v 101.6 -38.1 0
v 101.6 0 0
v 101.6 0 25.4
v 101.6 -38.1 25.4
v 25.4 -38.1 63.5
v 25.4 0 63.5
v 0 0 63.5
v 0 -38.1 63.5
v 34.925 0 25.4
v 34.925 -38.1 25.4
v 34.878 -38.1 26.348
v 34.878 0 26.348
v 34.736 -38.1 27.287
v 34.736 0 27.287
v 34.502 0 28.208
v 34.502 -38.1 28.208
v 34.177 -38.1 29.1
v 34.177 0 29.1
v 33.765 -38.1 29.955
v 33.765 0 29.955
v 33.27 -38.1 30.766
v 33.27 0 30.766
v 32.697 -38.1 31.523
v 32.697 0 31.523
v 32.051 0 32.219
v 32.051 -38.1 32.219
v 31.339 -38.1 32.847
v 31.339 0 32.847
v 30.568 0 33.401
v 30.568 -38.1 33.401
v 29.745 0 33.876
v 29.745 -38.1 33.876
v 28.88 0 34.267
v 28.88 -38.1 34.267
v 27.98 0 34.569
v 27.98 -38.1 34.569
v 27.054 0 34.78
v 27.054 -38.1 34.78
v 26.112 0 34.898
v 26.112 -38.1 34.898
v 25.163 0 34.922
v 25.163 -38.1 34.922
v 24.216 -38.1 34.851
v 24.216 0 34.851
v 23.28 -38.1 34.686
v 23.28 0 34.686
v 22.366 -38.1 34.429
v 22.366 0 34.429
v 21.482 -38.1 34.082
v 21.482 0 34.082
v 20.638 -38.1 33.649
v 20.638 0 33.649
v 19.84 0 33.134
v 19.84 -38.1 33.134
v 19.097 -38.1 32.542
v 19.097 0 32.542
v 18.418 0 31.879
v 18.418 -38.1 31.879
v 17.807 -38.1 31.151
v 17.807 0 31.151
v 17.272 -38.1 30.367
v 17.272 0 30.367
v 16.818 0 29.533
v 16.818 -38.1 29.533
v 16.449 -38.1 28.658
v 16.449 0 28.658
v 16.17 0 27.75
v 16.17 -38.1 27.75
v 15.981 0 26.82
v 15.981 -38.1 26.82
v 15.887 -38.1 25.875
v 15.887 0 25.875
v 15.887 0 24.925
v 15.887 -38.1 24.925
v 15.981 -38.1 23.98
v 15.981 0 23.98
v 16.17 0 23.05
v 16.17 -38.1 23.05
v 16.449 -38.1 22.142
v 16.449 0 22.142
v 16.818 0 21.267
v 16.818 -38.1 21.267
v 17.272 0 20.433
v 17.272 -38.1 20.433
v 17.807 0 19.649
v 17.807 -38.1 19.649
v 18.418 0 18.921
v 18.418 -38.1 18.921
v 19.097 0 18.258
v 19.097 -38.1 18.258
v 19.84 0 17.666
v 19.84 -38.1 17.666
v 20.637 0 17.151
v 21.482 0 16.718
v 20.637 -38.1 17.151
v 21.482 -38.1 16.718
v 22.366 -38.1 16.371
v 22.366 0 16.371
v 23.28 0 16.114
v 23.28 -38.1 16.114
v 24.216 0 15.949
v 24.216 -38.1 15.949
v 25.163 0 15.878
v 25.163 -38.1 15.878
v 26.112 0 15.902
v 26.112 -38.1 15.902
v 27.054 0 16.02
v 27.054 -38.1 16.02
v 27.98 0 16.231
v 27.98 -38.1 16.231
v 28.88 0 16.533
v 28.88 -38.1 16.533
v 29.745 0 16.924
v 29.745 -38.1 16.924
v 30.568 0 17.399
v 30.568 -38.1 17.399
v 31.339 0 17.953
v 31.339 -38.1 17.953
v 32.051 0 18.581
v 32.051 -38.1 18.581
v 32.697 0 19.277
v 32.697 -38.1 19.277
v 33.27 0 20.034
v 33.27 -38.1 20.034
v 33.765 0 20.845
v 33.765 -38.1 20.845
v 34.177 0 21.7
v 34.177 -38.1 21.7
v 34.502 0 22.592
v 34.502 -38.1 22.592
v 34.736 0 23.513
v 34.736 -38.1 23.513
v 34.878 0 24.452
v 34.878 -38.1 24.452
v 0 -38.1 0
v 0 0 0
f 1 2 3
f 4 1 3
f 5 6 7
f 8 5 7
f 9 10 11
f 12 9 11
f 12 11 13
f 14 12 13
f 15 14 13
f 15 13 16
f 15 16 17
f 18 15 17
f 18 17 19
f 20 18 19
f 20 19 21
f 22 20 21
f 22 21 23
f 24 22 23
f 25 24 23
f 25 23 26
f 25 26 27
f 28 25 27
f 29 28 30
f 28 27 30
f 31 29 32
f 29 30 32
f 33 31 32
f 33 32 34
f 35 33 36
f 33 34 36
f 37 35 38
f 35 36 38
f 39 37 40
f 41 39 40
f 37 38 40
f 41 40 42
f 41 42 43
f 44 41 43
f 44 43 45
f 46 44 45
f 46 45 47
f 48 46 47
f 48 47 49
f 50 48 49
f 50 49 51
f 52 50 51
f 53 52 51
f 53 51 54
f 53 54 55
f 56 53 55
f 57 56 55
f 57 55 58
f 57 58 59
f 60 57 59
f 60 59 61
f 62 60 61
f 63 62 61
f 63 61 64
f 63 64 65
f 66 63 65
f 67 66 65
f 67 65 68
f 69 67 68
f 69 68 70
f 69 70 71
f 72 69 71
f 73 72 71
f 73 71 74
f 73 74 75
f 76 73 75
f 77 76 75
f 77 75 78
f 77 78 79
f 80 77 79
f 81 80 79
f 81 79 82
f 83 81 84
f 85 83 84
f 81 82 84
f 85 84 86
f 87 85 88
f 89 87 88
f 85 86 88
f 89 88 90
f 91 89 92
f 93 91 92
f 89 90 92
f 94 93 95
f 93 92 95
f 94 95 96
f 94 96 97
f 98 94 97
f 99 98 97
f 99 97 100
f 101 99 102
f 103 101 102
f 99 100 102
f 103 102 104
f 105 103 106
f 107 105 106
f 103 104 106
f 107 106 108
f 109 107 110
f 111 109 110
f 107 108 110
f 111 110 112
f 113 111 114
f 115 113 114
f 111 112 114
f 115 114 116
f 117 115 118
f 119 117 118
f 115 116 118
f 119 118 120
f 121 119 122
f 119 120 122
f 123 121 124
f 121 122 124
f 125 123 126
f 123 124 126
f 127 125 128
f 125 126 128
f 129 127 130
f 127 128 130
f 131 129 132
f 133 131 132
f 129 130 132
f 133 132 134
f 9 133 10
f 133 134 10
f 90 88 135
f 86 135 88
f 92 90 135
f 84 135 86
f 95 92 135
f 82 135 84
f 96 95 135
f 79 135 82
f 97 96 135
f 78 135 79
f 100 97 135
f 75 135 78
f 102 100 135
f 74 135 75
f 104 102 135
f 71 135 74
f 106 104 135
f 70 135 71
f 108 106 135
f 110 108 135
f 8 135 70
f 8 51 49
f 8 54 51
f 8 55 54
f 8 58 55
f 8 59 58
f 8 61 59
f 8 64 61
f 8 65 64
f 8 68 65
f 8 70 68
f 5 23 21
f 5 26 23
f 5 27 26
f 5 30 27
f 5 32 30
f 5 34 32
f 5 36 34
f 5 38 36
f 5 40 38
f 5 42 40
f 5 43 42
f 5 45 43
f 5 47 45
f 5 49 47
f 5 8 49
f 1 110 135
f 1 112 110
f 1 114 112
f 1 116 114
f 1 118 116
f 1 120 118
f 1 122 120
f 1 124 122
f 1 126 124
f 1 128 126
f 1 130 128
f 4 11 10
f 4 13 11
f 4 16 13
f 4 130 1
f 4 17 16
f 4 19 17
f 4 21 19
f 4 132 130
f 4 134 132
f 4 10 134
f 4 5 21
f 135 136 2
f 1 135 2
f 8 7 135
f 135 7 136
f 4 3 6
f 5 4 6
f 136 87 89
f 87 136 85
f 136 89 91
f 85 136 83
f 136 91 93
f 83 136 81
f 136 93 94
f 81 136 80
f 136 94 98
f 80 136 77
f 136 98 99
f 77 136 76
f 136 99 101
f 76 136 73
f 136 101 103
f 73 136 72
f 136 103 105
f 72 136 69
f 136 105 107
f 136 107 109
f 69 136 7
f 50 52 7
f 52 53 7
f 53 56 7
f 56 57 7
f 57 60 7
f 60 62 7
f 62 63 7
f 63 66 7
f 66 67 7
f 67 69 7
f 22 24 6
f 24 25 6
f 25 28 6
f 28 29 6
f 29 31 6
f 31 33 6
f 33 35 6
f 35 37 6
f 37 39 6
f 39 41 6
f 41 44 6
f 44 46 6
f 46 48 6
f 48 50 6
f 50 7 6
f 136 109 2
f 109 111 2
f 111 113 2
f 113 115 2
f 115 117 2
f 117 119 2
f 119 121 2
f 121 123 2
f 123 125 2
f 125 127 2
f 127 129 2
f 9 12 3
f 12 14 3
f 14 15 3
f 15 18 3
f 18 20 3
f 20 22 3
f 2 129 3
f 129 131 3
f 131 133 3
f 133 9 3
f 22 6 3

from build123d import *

# Parameters (mm, degrees)
F1_DEPTH = 38.1
F2_R     = 9.525
F3_DEPTH = 38.101


with BuildPart() as f1:
    # F0 (on Front) → F1 (new body)
    with BuildSketch(Plane.XZ):
        Polygon((0, 63.5), (0, 0), (101.6, 0), (101.6, 25.4), (25.4, 63.5), align=None)
    extrude(amount=F1_DEPTH)

    # F2 (on face) → F3 (cut, through all)
    with BuildSketch(Plane.XZ.offset(38.1)):
        with Locations((25.4, 25.4)):
            Circle(F2_R)
    extrude(amount=-F3_DEPTH, mode=Mode.SUBTRACT)


solid = f1.part
